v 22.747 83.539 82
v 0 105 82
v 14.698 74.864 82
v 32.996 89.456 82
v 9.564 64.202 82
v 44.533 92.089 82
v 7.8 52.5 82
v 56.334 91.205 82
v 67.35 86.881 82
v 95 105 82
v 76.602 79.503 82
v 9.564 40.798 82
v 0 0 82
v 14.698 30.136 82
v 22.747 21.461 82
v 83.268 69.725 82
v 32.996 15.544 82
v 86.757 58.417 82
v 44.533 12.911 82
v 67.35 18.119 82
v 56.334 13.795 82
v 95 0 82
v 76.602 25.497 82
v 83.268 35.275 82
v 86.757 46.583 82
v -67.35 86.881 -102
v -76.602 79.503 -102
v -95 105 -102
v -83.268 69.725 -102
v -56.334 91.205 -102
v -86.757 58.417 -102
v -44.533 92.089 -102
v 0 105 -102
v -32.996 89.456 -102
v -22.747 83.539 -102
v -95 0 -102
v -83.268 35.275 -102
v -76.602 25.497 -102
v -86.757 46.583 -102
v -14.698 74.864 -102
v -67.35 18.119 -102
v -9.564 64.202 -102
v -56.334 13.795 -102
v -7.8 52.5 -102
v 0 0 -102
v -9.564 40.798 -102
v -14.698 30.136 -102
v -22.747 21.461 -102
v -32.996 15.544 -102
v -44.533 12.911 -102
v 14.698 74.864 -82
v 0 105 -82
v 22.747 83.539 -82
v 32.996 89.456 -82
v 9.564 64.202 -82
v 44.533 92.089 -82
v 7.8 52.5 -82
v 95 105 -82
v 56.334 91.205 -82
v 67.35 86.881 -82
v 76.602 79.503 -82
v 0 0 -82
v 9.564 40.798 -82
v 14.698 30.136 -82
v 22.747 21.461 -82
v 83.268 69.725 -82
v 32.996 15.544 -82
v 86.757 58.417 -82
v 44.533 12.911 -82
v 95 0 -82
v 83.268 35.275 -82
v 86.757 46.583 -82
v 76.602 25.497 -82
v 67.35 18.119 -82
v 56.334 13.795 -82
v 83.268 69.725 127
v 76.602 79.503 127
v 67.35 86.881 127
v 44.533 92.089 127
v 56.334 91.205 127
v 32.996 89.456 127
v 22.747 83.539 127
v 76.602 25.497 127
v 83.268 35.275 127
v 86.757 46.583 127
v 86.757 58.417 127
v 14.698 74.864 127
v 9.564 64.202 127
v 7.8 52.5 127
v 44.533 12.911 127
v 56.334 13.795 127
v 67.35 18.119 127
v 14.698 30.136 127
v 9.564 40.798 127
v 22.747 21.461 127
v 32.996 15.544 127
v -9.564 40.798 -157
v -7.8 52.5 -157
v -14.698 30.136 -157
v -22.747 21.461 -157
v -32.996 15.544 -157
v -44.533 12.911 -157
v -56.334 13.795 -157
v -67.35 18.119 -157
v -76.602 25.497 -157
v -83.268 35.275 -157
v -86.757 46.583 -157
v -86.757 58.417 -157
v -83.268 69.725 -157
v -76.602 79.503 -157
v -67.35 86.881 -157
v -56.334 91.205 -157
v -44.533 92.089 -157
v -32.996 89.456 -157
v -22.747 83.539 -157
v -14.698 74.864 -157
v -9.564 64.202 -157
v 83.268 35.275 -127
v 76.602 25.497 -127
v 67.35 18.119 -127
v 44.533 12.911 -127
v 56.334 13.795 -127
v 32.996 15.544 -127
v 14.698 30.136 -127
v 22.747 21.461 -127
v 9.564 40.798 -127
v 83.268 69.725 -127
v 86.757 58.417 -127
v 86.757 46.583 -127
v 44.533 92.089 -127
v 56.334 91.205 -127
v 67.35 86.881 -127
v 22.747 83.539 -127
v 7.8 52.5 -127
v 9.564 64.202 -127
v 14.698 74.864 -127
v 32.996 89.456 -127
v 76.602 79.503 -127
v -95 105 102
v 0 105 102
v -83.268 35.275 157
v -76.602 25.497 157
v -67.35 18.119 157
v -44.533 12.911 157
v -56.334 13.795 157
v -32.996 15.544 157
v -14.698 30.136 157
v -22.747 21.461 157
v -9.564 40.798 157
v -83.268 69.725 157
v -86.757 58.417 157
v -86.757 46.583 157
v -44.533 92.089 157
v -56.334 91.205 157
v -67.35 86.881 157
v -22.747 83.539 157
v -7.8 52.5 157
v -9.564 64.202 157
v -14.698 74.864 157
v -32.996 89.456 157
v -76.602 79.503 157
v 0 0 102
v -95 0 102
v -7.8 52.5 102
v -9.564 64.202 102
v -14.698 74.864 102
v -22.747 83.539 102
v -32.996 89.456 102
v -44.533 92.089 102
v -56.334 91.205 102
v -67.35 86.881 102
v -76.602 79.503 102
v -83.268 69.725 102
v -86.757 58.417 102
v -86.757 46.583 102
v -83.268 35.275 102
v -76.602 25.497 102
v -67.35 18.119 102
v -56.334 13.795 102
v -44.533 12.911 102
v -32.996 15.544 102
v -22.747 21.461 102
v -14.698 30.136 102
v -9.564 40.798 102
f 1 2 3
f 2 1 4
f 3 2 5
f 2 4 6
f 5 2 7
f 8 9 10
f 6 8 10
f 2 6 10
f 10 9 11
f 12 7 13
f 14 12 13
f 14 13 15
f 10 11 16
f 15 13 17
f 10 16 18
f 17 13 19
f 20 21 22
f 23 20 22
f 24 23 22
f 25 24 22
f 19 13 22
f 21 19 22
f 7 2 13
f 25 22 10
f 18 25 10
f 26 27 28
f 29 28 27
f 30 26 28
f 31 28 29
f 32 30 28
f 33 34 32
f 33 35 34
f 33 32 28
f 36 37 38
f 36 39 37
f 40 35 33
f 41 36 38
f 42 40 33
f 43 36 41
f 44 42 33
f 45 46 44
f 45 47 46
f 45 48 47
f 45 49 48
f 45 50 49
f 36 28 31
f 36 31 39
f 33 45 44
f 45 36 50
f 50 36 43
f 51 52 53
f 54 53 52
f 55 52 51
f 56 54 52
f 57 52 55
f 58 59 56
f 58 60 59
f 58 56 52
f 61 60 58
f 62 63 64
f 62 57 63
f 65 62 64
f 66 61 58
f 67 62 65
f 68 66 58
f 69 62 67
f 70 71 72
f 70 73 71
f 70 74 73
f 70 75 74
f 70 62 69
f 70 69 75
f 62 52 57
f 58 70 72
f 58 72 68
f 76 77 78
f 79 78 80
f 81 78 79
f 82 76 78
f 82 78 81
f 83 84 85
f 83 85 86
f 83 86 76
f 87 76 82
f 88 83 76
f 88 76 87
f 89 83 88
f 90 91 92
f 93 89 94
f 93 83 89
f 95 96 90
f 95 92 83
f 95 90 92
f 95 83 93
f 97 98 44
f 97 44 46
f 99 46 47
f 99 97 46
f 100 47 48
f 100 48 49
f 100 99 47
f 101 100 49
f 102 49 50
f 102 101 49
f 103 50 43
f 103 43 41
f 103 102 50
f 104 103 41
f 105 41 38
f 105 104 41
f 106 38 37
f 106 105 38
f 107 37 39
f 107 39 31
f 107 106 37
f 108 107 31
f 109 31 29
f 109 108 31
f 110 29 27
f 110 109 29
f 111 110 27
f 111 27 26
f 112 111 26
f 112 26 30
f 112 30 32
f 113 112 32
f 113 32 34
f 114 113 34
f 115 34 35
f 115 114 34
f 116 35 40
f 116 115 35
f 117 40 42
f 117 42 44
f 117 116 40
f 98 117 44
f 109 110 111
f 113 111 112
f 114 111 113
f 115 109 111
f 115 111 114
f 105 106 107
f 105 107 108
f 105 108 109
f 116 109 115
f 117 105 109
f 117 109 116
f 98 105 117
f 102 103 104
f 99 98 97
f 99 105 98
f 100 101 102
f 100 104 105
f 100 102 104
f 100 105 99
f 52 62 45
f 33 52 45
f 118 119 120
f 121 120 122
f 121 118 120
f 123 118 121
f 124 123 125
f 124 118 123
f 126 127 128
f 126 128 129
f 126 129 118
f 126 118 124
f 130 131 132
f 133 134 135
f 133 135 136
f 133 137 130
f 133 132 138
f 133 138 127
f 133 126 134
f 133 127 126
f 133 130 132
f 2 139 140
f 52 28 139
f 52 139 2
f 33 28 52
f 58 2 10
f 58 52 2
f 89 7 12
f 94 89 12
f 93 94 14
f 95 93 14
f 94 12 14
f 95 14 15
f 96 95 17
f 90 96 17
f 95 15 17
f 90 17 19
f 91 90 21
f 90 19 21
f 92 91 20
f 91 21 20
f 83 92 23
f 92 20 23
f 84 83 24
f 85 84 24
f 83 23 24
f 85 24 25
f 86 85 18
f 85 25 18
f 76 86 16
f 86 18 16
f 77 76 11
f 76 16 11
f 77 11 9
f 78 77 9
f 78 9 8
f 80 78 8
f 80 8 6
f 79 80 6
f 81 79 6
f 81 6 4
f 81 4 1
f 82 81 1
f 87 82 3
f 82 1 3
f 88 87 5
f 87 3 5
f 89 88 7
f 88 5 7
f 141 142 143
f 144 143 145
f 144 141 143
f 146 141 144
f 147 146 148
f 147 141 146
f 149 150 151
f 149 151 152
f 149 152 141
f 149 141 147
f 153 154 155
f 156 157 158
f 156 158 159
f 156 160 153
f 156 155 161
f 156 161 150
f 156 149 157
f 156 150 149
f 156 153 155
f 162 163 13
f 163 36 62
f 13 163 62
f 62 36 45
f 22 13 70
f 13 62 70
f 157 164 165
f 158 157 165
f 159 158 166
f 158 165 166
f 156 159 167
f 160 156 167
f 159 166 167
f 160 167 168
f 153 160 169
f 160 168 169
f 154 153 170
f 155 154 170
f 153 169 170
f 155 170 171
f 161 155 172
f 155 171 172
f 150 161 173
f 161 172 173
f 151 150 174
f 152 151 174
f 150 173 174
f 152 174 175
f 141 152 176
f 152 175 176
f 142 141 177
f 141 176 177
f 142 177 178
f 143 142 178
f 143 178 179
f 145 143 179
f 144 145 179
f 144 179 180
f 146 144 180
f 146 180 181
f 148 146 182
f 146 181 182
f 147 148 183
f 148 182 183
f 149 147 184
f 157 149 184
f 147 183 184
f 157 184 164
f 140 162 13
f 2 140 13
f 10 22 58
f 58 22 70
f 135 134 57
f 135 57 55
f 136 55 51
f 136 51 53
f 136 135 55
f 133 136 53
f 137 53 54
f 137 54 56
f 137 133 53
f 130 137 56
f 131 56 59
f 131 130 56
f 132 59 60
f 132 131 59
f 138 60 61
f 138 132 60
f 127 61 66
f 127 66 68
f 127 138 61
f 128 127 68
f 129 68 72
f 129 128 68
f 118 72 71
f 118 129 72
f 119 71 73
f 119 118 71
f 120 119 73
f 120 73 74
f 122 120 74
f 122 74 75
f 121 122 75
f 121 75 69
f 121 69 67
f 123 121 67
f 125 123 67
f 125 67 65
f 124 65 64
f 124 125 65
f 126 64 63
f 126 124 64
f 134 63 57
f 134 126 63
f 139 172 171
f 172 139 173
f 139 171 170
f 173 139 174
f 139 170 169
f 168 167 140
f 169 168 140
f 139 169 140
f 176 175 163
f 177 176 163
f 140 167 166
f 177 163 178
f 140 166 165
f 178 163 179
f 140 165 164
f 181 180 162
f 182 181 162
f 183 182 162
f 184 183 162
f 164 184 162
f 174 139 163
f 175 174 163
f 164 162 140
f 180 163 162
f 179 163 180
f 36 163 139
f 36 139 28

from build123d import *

# Parameters (mm, degrees)
SKETCH_1_W      = 190
SKETCH_1_H      = 164
EXTRUDE_2_DEPTH = 105
SKETCH_1_5_W    = 95
SKETCH_1_5_H    = 204
EXTRUDE_3_DEPTH = 105
SKETCH_2_R      = 39.7
EXTRUDE_4_DEPTH = 55
SKETCH_3_R      = 39.7
EXTRUDE_5_DEPTH = 45
EXTRUDE_START   = 55
SKETCH_4_R      = 39.7
EXTRUDE_6_DEPTH = 55
EXTRUDE_START_2 = 45
SKETCH_5_R      = 39.7
EXTRUDE_7_DEPTH = 45


with BuildPart() as part:
    # 草图1 → 凸台-拉伸2 (new body)
    with BuildSketch(Plane(origin=(0, 0, 0), x_dir=(1, 0, 0), z_dir=(0, 1, 0))):
        Rectangle(SKETCH_1_W, SKETCH_1_H)
    extrude(amount=EXTRUDE_2_DEPTH)

    # 草图1<5> → 凸台-拉伸3 (add)
    with BuildSketch(Plane(origin=(0, 0, 0), x_dir=(1, 0, 0), z_dir=(0, 1, 0))):
        with Locations((-47.5, 0)):
            Rectangle(SKETCH_1_5_W, SKETCH_1_5_H)
    extrude(amount=EXTRUDE_3_DEPTH)

    # 草图2 → 凸台-拉伸4 (add)
    with BuildSketch(Plane.XY.offset(102)):
        with Locations((-47.5, 52.5)):
            Circle(SKETCH_2_R)
    extrude(amount=EXTRUDE_4_DEPTH)

    # 草图3 → 凸台-拉伸5 (add)
    with BuildSketch(Plane.XY.offset(82)):
        with Locations((47.5, 52.5)):
            Circle(SKETCH_3_R)
    extrude(amount=EXTRUDE_5_DEPTH)

    # 草图4 → 凸台-拉伸6 (add)
    with BuildSketch(Plane(origin=(0, 0, -102), x_dir=(-1, 0, 0), z_dir=(0, 0, -1)).offset(EXTRUDE_START)):
        with Locations((47.5, 52.5)):
            Circle(SKETCH_4_R)
    extrude(amount=-EXTRUDE_6_DEPTH)

    # 草图5 → 凸台-拉伸7 (add)
    with BuildSketch(Plane(origin=(0, 0, -82), x_dir=(-1, 0, 0), z_dir=(0, 0, -1)).offset(EXTRUDE_START_2)):
        with Locations((-47.5, 52.5)):
            Circle(SKETCH_5_R)
    extrude(amount=-EXTRUDE_7_DEPTH)


solid = part.part
